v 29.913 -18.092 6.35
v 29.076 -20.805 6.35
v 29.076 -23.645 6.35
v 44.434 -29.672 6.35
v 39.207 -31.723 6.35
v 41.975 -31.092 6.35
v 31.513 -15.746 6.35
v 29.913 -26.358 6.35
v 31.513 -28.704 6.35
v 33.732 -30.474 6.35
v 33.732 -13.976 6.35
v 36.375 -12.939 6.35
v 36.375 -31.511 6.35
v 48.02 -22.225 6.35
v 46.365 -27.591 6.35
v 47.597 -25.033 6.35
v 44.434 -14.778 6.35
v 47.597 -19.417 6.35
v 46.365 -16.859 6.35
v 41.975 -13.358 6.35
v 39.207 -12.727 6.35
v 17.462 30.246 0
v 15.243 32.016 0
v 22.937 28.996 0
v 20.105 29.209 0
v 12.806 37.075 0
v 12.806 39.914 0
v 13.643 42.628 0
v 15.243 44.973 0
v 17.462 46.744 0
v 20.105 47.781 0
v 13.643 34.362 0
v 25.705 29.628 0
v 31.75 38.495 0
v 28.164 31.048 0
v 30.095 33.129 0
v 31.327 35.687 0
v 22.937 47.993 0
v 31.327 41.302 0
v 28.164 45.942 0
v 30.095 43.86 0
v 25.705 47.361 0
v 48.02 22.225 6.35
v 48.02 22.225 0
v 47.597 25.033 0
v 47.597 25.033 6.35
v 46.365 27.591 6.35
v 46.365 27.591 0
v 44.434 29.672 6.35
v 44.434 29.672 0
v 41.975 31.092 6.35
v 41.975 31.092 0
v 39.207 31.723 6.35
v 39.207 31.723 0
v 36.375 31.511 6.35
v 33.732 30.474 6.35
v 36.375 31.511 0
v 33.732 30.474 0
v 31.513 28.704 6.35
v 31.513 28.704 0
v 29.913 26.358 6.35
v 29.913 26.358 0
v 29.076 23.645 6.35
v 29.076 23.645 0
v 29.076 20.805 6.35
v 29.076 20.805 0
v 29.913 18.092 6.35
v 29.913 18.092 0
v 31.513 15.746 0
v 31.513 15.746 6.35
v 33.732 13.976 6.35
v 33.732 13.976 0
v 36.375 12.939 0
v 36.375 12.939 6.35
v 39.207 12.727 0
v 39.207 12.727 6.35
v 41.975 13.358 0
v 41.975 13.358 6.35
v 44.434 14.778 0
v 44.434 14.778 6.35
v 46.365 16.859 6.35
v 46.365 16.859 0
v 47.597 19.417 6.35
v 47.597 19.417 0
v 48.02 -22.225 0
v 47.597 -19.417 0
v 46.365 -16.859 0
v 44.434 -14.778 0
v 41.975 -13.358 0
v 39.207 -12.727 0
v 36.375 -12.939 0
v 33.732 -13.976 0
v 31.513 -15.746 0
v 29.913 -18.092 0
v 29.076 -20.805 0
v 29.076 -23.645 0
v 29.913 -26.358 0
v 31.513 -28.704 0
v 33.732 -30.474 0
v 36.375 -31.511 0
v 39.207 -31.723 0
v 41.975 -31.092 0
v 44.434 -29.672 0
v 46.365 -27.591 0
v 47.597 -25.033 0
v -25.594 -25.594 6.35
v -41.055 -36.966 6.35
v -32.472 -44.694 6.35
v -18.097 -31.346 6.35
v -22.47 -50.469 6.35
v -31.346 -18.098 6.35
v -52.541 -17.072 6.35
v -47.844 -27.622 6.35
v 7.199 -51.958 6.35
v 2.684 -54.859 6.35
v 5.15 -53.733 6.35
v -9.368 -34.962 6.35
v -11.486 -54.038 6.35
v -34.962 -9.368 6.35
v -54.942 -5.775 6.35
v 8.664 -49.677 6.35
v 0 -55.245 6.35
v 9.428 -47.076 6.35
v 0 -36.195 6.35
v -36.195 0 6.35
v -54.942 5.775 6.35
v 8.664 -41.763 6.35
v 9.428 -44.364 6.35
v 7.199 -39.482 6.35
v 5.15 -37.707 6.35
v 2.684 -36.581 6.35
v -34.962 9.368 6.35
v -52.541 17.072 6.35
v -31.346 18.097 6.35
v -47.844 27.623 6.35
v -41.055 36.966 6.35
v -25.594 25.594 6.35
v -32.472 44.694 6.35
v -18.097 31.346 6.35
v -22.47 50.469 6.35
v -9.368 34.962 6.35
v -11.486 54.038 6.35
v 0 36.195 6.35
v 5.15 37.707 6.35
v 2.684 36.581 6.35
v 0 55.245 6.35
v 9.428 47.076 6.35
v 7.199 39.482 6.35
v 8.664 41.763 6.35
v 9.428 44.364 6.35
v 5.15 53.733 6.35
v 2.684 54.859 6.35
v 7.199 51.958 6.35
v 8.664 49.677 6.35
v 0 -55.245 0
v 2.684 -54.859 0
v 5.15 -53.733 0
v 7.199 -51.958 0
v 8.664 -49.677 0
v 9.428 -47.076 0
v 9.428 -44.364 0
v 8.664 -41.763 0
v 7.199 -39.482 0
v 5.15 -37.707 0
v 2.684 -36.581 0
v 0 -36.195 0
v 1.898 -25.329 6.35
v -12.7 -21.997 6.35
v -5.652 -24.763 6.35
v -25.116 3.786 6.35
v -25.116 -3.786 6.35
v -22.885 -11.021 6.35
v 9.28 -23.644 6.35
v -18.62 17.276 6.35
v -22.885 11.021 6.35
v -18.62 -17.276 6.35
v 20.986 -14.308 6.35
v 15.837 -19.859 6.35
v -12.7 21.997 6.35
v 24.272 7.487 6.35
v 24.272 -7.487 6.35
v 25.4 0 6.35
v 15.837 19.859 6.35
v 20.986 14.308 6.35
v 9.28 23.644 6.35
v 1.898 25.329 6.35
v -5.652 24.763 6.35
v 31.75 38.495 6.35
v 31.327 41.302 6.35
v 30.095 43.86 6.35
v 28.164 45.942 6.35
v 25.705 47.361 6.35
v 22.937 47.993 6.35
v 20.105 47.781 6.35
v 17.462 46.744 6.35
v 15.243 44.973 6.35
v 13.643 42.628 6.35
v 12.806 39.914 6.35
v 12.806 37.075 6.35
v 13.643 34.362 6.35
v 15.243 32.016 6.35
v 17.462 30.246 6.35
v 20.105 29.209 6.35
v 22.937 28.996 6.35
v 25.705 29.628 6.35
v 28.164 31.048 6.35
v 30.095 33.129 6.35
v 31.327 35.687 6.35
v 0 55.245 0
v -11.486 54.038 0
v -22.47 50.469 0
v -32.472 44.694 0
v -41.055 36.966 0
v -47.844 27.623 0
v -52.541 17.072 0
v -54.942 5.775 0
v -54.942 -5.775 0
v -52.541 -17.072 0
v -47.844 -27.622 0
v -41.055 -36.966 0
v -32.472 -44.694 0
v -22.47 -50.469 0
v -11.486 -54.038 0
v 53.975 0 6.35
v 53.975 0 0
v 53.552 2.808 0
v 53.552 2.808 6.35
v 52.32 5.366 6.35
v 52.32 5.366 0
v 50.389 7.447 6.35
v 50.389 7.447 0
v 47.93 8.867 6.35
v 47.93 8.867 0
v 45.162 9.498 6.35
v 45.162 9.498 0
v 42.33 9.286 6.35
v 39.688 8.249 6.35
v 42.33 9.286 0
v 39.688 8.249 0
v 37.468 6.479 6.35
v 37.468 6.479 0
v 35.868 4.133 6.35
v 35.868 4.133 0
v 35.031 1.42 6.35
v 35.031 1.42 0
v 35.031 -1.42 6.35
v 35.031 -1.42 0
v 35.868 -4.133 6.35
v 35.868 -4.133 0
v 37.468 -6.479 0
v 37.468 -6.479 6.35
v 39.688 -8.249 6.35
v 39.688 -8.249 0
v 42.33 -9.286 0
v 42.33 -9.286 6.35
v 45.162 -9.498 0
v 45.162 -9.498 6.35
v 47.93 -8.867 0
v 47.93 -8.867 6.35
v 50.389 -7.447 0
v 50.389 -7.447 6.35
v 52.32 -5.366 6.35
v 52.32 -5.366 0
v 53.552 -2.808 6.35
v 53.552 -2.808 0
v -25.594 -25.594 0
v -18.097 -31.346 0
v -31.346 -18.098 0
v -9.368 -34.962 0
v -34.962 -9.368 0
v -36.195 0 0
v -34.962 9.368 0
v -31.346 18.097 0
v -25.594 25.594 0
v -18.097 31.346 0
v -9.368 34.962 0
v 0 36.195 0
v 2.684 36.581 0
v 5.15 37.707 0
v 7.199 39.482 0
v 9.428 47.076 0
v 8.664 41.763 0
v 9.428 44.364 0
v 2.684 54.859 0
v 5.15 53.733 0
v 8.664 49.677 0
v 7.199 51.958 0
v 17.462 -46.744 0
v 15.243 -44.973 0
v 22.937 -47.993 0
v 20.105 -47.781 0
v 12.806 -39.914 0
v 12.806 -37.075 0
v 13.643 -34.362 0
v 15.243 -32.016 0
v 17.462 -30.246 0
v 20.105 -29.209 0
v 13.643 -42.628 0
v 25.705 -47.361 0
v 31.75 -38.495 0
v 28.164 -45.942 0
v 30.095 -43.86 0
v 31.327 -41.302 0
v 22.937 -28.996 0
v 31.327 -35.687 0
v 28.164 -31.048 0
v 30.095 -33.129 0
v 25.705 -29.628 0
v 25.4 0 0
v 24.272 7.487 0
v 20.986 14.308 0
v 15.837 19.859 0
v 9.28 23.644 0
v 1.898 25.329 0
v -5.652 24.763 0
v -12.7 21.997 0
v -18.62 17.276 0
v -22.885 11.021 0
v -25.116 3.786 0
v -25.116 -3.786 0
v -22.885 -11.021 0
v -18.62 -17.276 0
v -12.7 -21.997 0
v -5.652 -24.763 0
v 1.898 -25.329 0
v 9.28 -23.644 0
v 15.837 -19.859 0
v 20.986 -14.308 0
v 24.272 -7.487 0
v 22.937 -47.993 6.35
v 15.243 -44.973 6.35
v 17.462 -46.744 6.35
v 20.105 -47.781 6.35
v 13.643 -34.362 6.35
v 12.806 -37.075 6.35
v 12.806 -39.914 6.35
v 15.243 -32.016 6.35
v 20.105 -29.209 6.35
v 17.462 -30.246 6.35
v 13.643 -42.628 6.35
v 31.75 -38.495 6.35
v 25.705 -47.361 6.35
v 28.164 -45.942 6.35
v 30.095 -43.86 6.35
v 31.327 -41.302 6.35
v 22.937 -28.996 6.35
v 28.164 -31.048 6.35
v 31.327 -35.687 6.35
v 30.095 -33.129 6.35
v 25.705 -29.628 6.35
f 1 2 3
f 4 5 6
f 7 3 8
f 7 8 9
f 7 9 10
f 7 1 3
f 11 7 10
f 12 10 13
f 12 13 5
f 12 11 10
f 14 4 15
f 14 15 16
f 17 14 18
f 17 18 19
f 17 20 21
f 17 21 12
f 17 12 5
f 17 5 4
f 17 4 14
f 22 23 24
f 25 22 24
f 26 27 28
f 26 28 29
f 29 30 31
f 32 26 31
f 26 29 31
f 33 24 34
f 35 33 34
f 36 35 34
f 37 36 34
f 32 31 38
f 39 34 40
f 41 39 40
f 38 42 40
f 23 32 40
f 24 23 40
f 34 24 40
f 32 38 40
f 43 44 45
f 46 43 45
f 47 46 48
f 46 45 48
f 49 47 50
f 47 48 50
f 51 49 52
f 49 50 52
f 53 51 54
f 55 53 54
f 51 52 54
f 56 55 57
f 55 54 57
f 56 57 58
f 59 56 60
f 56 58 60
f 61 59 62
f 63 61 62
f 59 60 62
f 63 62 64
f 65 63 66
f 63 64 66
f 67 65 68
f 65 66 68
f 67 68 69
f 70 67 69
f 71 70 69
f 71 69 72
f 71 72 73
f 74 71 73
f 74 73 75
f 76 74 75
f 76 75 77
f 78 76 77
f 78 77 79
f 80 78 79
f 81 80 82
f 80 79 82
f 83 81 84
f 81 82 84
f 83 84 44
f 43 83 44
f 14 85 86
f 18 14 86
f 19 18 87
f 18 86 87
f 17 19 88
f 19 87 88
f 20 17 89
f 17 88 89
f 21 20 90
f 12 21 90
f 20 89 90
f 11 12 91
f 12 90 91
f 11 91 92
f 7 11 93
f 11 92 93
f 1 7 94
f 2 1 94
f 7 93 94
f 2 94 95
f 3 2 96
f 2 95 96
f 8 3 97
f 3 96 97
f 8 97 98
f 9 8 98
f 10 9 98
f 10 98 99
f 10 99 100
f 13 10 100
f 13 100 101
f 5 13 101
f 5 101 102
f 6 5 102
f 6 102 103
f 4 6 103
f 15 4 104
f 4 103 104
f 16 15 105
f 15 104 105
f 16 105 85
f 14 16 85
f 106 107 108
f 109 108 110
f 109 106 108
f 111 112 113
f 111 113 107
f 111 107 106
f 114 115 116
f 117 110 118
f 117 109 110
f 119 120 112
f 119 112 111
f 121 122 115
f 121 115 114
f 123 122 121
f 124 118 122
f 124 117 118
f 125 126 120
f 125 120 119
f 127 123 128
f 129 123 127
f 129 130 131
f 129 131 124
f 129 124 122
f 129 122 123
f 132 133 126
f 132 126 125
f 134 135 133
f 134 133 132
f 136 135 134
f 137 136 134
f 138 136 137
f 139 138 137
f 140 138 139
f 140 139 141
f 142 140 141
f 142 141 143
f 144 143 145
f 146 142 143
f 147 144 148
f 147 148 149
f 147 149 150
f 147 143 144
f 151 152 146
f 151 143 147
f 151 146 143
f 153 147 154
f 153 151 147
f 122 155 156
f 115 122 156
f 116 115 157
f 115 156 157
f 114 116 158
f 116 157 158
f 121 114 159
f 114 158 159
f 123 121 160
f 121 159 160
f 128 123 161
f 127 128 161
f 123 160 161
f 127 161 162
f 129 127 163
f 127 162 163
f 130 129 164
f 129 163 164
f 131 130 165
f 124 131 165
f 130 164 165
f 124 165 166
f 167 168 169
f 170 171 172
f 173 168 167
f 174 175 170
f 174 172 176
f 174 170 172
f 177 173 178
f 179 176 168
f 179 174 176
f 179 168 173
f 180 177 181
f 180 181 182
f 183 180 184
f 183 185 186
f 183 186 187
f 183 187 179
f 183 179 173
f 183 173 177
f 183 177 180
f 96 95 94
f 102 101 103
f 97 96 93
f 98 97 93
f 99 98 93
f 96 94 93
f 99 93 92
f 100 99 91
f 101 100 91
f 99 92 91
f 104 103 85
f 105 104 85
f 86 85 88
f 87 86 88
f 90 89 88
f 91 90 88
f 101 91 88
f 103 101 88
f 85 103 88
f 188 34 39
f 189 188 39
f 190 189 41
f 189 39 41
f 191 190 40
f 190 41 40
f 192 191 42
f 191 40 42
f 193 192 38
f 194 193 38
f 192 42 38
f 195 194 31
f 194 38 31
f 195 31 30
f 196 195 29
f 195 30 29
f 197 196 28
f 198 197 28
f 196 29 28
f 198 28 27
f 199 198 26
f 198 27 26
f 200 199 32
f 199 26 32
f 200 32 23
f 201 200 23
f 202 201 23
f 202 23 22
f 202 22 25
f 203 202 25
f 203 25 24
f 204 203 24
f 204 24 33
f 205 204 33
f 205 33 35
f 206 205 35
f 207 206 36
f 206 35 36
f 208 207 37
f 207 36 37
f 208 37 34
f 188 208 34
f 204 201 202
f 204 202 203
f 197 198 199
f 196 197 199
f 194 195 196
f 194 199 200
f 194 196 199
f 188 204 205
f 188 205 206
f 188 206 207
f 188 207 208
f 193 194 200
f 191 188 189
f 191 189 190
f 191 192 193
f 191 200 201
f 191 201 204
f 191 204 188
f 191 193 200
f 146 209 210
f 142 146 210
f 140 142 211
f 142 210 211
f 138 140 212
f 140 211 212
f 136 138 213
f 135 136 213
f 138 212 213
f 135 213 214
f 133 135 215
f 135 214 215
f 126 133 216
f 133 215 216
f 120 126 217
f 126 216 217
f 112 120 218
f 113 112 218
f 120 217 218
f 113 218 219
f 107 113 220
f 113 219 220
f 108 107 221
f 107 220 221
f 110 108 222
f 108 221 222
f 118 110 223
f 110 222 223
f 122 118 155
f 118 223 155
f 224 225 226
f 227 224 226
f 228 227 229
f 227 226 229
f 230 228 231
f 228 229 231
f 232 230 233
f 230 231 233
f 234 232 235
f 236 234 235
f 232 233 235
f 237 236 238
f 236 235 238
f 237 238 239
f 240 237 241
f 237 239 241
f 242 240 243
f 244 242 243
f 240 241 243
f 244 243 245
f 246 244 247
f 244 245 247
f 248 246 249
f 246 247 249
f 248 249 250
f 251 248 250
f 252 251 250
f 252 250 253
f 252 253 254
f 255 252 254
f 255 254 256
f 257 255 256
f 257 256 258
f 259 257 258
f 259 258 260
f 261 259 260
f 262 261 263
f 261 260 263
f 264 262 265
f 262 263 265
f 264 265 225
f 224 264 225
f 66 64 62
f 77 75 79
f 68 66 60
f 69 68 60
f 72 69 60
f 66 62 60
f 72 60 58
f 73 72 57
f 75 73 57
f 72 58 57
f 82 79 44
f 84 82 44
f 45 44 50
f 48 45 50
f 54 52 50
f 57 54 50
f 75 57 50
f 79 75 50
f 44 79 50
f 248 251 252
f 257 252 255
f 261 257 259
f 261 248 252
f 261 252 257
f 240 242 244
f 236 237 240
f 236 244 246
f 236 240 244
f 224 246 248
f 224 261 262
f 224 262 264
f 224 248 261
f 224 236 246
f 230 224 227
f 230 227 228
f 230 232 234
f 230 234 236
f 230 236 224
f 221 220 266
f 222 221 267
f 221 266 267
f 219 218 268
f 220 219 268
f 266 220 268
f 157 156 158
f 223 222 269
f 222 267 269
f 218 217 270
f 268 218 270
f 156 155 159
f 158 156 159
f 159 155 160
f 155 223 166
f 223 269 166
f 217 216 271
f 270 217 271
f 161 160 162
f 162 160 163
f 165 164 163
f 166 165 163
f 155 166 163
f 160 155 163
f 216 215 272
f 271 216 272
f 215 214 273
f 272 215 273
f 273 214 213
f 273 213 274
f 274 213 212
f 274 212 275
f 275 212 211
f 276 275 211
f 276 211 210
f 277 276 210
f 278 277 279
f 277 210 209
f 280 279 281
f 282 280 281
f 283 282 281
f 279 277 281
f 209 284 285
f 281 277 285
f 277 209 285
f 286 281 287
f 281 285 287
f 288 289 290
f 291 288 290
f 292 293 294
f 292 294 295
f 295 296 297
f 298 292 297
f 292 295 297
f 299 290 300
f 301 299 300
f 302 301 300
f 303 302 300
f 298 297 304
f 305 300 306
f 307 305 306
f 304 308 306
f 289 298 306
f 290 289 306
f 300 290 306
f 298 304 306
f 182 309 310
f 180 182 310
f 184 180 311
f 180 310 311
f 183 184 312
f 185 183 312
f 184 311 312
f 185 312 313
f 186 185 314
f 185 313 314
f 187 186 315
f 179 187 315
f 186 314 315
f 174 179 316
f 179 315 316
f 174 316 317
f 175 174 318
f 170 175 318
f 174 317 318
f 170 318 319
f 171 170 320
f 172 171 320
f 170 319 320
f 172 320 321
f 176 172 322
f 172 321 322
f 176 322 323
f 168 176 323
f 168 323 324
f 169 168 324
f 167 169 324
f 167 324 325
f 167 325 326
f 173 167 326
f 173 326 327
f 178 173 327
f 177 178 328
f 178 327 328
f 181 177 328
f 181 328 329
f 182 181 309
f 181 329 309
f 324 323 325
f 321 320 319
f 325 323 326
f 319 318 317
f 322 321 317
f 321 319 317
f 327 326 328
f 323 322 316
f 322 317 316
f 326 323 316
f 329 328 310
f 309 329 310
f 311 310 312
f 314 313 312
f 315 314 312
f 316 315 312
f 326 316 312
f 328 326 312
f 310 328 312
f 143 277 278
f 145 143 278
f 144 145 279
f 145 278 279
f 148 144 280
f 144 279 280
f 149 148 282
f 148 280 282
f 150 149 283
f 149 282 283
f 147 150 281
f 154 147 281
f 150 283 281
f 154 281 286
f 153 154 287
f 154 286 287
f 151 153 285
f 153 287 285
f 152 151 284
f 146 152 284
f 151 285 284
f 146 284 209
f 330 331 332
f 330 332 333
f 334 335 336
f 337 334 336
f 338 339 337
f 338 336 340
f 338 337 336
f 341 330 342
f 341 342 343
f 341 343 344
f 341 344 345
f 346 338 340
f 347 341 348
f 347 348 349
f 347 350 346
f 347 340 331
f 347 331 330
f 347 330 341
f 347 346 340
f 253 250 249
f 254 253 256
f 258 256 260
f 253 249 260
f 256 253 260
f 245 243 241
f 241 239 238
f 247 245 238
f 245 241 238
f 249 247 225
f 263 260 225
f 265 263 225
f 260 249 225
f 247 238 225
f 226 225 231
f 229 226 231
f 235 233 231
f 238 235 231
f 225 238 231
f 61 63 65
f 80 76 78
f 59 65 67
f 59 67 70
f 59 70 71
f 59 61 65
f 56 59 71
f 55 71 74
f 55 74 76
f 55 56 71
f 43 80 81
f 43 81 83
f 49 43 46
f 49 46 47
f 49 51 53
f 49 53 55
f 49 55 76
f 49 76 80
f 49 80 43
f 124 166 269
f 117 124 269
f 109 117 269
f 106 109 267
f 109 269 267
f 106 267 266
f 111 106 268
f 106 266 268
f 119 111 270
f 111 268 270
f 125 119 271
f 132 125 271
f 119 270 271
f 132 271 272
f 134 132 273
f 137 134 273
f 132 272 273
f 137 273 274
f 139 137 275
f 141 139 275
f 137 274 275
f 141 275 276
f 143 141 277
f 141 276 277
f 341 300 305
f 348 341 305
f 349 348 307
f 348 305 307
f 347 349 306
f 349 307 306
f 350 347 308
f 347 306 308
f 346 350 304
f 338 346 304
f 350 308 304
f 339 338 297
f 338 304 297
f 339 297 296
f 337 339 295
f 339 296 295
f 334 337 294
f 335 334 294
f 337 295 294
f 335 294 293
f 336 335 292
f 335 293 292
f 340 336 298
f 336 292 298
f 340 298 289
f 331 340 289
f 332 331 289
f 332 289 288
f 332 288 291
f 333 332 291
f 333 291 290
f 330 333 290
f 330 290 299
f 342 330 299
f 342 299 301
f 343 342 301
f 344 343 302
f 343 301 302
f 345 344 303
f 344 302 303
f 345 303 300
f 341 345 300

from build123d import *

# Parameters (mm, degrees)
F0_R     = 25.4
F0_R_2   = 9.525
F1_DEPTH = 6.35


with BuildPart() as f1:
    # F0 (on Top) → F1 (new body)
    with BuildSketch(Plane.XY):
        with BuildLine():
            ThreePointArc((0, 36.195), (9.525, 45.72), (0, 55.245))
            ThreePointArc((0, 55.245), (-55.245, 0), (0, -55.245))
            ThreePointArc((0, -55.245), (9.525, -45.72), (0, -36.195))
            ThreePointArc((0, -36.195), (-36.195, 0), (0, 36.195))
        make_face()
        Circle(F0_R)
        with Locations((22.225, -38.494829)):
            Circle(F0_R_2)
        with Locations((38.494829, -22.225)):
            Circle(F0_R_2)
        with Locations((44.45, 0)):
            Circle(F0_R_2)
        with Locations((38.494829, 22.225)):
            Circle(F0_R_2)
        with Locations((22.225, 38.494829)):
            Circle(F0_R_2)
    extrude(amount=F1_DEPTH)


solid = f1.part
